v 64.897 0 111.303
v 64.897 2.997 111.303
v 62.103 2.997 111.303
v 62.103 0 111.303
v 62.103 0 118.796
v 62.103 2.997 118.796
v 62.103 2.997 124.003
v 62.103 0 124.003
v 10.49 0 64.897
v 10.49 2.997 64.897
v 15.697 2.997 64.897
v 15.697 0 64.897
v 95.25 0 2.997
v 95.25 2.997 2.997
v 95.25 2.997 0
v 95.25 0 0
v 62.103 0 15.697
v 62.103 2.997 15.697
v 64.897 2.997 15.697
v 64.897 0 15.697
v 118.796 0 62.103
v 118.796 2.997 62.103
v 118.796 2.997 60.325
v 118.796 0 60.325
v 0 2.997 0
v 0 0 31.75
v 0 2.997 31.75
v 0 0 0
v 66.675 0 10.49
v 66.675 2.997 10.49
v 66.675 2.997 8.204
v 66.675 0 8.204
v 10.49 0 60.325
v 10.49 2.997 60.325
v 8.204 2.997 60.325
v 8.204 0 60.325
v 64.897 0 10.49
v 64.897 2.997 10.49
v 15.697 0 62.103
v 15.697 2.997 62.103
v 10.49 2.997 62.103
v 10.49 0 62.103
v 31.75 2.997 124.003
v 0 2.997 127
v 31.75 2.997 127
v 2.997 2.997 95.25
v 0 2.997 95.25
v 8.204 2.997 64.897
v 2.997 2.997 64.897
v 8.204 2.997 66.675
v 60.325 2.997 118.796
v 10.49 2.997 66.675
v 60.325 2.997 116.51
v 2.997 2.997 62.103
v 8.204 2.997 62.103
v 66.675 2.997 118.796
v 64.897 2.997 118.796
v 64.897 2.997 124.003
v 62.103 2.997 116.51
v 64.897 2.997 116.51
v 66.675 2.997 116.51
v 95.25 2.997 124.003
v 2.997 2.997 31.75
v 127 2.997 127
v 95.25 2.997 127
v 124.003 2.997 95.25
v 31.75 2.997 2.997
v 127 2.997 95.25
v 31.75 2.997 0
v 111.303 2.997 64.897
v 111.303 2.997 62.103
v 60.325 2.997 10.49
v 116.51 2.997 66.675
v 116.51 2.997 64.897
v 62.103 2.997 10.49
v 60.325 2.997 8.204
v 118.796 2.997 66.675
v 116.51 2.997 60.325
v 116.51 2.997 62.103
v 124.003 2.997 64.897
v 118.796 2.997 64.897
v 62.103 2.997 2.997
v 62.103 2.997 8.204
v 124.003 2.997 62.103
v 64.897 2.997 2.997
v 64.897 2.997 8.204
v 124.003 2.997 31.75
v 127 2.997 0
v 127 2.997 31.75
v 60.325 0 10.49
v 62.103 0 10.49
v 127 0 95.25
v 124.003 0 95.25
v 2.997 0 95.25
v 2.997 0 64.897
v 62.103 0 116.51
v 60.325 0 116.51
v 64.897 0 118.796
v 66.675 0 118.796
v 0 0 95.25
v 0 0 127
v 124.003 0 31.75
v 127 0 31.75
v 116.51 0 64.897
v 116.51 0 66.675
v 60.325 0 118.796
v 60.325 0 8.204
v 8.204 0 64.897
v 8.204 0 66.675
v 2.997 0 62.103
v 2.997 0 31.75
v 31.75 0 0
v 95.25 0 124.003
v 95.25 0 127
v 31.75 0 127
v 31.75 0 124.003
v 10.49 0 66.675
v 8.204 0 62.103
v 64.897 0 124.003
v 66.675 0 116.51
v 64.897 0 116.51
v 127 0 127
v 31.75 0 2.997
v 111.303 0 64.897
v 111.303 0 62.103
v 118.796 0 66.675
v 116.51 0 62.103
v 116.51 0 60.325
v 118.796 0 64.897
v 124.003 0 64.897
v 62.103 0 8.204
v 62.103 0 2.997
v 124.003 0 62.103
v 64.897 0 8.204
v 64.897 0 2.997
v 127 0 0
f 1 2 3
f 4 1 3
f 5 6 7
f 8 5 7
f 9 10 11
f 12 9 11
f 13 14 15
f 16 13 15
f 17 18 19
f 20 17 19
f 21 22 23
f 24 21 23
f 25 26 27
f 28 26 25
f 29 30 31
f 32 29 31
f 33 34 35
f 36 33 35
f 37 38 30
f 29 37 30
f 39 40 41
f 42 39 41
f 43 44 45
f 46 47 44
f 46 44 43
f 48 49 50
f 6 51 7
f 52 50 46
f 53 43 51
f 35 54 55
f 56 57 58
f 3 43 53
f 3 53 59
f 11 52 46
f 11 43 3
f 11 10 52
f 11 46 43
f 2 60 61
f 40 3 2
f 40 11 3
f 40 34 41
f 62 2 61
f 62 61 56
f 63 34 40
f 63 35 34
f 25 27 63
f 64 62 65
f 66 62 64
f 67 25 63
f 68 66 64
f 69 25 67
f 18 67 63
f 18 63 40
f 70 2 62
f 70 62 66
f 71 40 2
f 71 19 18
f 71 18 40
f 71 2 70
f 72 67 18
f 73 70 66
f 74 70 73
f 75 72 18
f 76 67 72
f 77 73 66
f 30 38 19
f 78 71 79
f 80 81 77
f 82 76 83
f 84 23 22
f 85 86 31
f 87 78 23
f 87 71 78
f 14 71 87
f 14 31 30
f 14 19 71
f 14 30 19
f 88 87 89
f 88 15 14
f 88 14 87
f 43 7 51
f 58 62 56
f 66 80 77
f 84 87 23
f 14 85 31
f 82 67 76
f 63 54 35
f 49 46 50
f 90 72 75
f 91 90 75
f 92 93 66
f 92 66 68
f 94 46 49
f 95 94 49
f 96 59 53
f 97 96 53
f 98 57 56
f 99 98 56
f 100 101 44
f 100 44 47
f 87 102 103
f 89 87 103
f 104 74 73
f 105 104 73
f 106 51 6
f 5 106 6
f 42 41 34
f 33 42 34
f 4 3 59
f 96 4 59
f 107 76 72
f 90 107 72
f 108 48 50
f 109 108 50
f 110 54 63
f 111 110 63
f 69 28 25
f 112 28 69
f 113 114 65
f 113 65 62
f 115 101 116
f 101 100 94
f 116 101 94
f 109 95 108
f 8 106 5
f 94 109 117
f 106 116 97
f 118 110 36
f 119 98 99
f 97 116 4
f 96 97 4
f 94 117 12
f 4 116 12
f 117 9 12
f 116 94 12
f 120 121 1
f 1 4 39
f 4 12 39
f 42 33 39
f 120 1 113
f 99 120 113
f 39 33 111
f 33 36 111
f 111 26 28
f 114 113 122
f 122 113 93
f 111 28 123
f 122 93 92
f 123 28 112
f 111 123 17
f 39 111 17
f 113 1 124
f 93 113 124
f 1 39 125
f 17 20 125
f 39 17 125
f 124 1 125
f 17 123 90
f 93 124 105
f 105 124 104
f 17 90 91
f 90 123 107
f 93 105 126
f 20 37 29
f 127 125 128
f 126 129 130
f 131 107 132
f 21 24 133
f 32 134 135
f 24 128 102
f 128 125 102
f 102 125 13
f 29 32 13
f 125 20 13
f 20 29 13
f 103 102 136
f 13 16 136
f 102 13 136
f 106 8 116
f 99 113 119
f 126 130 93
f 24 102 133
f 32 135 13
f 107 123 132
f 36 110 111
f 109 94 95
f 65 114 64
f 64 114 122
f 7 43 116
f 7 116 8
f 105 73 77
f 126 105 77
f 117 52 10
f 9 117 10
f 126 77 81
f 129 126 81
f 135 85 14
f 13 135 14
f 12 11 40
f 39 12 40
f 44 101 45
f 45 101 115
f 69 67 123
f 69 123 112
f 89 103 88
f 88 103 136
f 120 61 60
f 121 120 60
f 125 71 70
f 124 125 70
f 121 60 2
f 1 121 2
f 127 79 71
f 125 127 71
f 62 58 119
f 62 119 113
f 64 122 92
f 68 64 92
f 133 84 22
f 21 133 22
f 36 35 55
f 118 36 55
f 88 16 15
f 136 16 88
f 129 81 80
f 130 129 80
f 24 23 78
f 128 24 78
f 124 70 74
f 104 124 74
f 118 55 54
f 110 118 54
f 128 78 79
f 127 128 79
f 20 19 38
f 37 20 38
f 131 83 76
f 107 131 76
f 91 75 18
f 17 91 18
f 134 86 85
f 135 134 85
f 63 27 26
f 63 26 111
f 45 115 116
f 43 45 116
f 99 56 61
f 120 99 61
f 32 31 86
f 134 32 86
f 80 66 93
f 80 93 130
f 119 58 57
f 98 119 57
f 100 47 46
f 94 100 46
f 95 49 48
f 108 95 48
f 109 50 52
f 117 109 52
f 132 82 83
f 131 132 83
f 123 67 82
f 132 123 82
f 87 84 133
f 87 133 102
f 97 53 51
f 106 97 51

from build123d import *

# Parameters (mm, degrees)
SKETCH1_W           = 127
SKETCH1_H           = 127
BOSS_EXTRUDE1_DEPTH = 2.9972
SKETCH2_W           = 63.5
SKETCH2_H           = 2.9972
SKETCH2_W_2         = 2.9972
SKETCH2_H_2         = 63.5
CUT_EXTRUDE1_DEPTH  = 2.9972
CUT_EXTRUDE2_REACH  = 181.63


with BuildPart() as part:
    # Sketch1 → Boss-Extrude1 (new body)
    with BuildSketch(Plane(origin=(0, 0, 0), x_dir=(1, 0, 0), z_dir=(0, 1, 0))):
        with Locations((63.5, -63.5)):
            Rectangle(SKETCH1_W, SKETCH1_H)
    extrude(amount=BOSS_EXTRUDE1_DEPTH)

    # Sketch2 → Cut-Extrude1 (cut)
    with BuildSketch(Plane(origin=(0, 2.9972, 0), x_dir=(1, 0, 0), z_dir=(0, 1, 0))):
        with Locations((63.5, -125.5014)):
            Rectangle(SKETCH2_W, SKETCH2_H)
        with Locations((1.4986, -63.5)):
            Rectangle(SKETCH2_W_2, SKETCH2_H_2)
        with Locations((125.5014, -63.5)):
            Rectangle(SKETCH2_W_2, SKETCH2_H_2)
        with Locations((63.5, -1.4986)):
            Rectangle(SKETCH2_W, SKETCH2_H)
    extrude(amount=-CUT_EXTRUDE1_DEPTH, mode=Mode.SUBTRACT)

    # Sketch3 → Cut-Extrude2 (cut, up to next)
    with BuildSketch(Plane(origin=(0, 2.9972, 0), x_dir=(1, 0, 0), z_dir=(0, 1, 0)), mode=Mode.PRIVATE) as cut_extrude2_sk1:
        Polygon((2.9972, -64.897), (8.2042, -64.897), (8.2042, -66.675), (10.4902, -66.675), (10.4902, -64.897), (15.6972, -64.897), (15.6972, -62.103), (10.4902, -62.103), (10.4902, -60.325), (8.2042, -60.325), (8.2042, -62.103), (2.9972, -62.103), align=None)
    cut_extrude2_tool1 = extrude(cut_extrude2_sk1.sketch, amount=-CUT_EXTRUDE2_REACH, mode=Mode.PRIVATE) & part.part
    # Sketch3 → Cut-Extrude2 (cut, up to next)
    with BuildSketch(Plane(origin=(0, 2.9972, 0), x_dir=(1, 0, 0), z_dir=(0, 1, 0)), mode=Mode.PRIVATE) as cut_extrude2_sk2:
        Polygon((62.103, -124.0028), (64.897, -124.0028), (64.897, -118.7958), (66.675, -118.7958), (66.675, -116.5098), (64.897, -116.5098), (64.897, -111.3028), (62.103, -111.3028), (62.103, -116.5098), (60.325, -116.5098), (60.325, -118.7958), (62.103, -118.7958), align=None)
    cut_extrude2_tool2 = extrude(cut_extrude2_sk2.sketch, amount=-CUT_EXTRUDE2_REACH, mode=Mode.PRIVATE) & part.part
    # Sketch3 → Cut-Extrude2 (cut, up to next)
    with BuildSketch(Plane(origin=(0, 2.9972, 0), x_dir=(1, 0, 0), z_dir=(0, 1, 0)), mode=Mode.PRIVATE) as cut_extrude2_sk3:
        Polygon((118.7958, -66.675), (118.7958, -64.897), (124.0028, -64.897), (124.0028, -62.103), (118.7958, -62.103), (118.7958, -60.325), (116.5098, -60.325), (116.5098, -62.103), (111.3028, -62.103), (111.3028, -64.897), (116.5098, -64.897), (116.5098, -66.675), align=None)
    cut_extrude2_tool3 = extrude(cut_extrude2_sk3.sketch, amount=-CUT_EXTRUDE2_REACH, mode=Mode.PRIVATE) & part.part
    # Sketch3 → Cut-Extrude2 (cut, up to next)
    with BuildSketch(Plane(origin=(0, 2.9972, 0), x_dir=(1, 0, 0), z_dir=(0, 1, 0)), mode=Mode.PRIVATE) as cut_extrude2_sk4:
        Polygon((62.103, -2.9972), (62.103, -8.2042), (60.325, -8.2042), (60.325, -10.4902), (62.103, -10.4902), (62.103, -15.6972), (64.897, -15.6972), (64.897, -10.4902), (66.675, -10.4902), (66.675, -8.2042), (64.897, -8.2042), (64.897, -2.9972), align=None)
    cut_extrude2_tool4 = extrude(cut_extrude2_sk4.sketch, amount=-CUT_EXTRUDE2_REACH, mode=Mode.PRIVATE) & part.part
    add(cut_extrude2_tool1.solids().sort_by_distance((9.3472, 2.9972, 63.5))[0], mode=Mode.SUBTRACT)
    add(cut_extrude2_tool2.solids().sort_by_distance((63.5, 2.9972, 117.6528))[0], mode=Mode.SUBTRACT)
    add(cut_extrude2_tool3.solids().sort_by_distance((117.6528, 2.9972, 63.5))[0], mode=Mode.SUBTRACT)
    add(cut_extrude2_tool4.solids().sort_by_distance((63.5, 2.9972, 9.3472))[0], mode=Mode.SUBTRACT)


solid = part.part
